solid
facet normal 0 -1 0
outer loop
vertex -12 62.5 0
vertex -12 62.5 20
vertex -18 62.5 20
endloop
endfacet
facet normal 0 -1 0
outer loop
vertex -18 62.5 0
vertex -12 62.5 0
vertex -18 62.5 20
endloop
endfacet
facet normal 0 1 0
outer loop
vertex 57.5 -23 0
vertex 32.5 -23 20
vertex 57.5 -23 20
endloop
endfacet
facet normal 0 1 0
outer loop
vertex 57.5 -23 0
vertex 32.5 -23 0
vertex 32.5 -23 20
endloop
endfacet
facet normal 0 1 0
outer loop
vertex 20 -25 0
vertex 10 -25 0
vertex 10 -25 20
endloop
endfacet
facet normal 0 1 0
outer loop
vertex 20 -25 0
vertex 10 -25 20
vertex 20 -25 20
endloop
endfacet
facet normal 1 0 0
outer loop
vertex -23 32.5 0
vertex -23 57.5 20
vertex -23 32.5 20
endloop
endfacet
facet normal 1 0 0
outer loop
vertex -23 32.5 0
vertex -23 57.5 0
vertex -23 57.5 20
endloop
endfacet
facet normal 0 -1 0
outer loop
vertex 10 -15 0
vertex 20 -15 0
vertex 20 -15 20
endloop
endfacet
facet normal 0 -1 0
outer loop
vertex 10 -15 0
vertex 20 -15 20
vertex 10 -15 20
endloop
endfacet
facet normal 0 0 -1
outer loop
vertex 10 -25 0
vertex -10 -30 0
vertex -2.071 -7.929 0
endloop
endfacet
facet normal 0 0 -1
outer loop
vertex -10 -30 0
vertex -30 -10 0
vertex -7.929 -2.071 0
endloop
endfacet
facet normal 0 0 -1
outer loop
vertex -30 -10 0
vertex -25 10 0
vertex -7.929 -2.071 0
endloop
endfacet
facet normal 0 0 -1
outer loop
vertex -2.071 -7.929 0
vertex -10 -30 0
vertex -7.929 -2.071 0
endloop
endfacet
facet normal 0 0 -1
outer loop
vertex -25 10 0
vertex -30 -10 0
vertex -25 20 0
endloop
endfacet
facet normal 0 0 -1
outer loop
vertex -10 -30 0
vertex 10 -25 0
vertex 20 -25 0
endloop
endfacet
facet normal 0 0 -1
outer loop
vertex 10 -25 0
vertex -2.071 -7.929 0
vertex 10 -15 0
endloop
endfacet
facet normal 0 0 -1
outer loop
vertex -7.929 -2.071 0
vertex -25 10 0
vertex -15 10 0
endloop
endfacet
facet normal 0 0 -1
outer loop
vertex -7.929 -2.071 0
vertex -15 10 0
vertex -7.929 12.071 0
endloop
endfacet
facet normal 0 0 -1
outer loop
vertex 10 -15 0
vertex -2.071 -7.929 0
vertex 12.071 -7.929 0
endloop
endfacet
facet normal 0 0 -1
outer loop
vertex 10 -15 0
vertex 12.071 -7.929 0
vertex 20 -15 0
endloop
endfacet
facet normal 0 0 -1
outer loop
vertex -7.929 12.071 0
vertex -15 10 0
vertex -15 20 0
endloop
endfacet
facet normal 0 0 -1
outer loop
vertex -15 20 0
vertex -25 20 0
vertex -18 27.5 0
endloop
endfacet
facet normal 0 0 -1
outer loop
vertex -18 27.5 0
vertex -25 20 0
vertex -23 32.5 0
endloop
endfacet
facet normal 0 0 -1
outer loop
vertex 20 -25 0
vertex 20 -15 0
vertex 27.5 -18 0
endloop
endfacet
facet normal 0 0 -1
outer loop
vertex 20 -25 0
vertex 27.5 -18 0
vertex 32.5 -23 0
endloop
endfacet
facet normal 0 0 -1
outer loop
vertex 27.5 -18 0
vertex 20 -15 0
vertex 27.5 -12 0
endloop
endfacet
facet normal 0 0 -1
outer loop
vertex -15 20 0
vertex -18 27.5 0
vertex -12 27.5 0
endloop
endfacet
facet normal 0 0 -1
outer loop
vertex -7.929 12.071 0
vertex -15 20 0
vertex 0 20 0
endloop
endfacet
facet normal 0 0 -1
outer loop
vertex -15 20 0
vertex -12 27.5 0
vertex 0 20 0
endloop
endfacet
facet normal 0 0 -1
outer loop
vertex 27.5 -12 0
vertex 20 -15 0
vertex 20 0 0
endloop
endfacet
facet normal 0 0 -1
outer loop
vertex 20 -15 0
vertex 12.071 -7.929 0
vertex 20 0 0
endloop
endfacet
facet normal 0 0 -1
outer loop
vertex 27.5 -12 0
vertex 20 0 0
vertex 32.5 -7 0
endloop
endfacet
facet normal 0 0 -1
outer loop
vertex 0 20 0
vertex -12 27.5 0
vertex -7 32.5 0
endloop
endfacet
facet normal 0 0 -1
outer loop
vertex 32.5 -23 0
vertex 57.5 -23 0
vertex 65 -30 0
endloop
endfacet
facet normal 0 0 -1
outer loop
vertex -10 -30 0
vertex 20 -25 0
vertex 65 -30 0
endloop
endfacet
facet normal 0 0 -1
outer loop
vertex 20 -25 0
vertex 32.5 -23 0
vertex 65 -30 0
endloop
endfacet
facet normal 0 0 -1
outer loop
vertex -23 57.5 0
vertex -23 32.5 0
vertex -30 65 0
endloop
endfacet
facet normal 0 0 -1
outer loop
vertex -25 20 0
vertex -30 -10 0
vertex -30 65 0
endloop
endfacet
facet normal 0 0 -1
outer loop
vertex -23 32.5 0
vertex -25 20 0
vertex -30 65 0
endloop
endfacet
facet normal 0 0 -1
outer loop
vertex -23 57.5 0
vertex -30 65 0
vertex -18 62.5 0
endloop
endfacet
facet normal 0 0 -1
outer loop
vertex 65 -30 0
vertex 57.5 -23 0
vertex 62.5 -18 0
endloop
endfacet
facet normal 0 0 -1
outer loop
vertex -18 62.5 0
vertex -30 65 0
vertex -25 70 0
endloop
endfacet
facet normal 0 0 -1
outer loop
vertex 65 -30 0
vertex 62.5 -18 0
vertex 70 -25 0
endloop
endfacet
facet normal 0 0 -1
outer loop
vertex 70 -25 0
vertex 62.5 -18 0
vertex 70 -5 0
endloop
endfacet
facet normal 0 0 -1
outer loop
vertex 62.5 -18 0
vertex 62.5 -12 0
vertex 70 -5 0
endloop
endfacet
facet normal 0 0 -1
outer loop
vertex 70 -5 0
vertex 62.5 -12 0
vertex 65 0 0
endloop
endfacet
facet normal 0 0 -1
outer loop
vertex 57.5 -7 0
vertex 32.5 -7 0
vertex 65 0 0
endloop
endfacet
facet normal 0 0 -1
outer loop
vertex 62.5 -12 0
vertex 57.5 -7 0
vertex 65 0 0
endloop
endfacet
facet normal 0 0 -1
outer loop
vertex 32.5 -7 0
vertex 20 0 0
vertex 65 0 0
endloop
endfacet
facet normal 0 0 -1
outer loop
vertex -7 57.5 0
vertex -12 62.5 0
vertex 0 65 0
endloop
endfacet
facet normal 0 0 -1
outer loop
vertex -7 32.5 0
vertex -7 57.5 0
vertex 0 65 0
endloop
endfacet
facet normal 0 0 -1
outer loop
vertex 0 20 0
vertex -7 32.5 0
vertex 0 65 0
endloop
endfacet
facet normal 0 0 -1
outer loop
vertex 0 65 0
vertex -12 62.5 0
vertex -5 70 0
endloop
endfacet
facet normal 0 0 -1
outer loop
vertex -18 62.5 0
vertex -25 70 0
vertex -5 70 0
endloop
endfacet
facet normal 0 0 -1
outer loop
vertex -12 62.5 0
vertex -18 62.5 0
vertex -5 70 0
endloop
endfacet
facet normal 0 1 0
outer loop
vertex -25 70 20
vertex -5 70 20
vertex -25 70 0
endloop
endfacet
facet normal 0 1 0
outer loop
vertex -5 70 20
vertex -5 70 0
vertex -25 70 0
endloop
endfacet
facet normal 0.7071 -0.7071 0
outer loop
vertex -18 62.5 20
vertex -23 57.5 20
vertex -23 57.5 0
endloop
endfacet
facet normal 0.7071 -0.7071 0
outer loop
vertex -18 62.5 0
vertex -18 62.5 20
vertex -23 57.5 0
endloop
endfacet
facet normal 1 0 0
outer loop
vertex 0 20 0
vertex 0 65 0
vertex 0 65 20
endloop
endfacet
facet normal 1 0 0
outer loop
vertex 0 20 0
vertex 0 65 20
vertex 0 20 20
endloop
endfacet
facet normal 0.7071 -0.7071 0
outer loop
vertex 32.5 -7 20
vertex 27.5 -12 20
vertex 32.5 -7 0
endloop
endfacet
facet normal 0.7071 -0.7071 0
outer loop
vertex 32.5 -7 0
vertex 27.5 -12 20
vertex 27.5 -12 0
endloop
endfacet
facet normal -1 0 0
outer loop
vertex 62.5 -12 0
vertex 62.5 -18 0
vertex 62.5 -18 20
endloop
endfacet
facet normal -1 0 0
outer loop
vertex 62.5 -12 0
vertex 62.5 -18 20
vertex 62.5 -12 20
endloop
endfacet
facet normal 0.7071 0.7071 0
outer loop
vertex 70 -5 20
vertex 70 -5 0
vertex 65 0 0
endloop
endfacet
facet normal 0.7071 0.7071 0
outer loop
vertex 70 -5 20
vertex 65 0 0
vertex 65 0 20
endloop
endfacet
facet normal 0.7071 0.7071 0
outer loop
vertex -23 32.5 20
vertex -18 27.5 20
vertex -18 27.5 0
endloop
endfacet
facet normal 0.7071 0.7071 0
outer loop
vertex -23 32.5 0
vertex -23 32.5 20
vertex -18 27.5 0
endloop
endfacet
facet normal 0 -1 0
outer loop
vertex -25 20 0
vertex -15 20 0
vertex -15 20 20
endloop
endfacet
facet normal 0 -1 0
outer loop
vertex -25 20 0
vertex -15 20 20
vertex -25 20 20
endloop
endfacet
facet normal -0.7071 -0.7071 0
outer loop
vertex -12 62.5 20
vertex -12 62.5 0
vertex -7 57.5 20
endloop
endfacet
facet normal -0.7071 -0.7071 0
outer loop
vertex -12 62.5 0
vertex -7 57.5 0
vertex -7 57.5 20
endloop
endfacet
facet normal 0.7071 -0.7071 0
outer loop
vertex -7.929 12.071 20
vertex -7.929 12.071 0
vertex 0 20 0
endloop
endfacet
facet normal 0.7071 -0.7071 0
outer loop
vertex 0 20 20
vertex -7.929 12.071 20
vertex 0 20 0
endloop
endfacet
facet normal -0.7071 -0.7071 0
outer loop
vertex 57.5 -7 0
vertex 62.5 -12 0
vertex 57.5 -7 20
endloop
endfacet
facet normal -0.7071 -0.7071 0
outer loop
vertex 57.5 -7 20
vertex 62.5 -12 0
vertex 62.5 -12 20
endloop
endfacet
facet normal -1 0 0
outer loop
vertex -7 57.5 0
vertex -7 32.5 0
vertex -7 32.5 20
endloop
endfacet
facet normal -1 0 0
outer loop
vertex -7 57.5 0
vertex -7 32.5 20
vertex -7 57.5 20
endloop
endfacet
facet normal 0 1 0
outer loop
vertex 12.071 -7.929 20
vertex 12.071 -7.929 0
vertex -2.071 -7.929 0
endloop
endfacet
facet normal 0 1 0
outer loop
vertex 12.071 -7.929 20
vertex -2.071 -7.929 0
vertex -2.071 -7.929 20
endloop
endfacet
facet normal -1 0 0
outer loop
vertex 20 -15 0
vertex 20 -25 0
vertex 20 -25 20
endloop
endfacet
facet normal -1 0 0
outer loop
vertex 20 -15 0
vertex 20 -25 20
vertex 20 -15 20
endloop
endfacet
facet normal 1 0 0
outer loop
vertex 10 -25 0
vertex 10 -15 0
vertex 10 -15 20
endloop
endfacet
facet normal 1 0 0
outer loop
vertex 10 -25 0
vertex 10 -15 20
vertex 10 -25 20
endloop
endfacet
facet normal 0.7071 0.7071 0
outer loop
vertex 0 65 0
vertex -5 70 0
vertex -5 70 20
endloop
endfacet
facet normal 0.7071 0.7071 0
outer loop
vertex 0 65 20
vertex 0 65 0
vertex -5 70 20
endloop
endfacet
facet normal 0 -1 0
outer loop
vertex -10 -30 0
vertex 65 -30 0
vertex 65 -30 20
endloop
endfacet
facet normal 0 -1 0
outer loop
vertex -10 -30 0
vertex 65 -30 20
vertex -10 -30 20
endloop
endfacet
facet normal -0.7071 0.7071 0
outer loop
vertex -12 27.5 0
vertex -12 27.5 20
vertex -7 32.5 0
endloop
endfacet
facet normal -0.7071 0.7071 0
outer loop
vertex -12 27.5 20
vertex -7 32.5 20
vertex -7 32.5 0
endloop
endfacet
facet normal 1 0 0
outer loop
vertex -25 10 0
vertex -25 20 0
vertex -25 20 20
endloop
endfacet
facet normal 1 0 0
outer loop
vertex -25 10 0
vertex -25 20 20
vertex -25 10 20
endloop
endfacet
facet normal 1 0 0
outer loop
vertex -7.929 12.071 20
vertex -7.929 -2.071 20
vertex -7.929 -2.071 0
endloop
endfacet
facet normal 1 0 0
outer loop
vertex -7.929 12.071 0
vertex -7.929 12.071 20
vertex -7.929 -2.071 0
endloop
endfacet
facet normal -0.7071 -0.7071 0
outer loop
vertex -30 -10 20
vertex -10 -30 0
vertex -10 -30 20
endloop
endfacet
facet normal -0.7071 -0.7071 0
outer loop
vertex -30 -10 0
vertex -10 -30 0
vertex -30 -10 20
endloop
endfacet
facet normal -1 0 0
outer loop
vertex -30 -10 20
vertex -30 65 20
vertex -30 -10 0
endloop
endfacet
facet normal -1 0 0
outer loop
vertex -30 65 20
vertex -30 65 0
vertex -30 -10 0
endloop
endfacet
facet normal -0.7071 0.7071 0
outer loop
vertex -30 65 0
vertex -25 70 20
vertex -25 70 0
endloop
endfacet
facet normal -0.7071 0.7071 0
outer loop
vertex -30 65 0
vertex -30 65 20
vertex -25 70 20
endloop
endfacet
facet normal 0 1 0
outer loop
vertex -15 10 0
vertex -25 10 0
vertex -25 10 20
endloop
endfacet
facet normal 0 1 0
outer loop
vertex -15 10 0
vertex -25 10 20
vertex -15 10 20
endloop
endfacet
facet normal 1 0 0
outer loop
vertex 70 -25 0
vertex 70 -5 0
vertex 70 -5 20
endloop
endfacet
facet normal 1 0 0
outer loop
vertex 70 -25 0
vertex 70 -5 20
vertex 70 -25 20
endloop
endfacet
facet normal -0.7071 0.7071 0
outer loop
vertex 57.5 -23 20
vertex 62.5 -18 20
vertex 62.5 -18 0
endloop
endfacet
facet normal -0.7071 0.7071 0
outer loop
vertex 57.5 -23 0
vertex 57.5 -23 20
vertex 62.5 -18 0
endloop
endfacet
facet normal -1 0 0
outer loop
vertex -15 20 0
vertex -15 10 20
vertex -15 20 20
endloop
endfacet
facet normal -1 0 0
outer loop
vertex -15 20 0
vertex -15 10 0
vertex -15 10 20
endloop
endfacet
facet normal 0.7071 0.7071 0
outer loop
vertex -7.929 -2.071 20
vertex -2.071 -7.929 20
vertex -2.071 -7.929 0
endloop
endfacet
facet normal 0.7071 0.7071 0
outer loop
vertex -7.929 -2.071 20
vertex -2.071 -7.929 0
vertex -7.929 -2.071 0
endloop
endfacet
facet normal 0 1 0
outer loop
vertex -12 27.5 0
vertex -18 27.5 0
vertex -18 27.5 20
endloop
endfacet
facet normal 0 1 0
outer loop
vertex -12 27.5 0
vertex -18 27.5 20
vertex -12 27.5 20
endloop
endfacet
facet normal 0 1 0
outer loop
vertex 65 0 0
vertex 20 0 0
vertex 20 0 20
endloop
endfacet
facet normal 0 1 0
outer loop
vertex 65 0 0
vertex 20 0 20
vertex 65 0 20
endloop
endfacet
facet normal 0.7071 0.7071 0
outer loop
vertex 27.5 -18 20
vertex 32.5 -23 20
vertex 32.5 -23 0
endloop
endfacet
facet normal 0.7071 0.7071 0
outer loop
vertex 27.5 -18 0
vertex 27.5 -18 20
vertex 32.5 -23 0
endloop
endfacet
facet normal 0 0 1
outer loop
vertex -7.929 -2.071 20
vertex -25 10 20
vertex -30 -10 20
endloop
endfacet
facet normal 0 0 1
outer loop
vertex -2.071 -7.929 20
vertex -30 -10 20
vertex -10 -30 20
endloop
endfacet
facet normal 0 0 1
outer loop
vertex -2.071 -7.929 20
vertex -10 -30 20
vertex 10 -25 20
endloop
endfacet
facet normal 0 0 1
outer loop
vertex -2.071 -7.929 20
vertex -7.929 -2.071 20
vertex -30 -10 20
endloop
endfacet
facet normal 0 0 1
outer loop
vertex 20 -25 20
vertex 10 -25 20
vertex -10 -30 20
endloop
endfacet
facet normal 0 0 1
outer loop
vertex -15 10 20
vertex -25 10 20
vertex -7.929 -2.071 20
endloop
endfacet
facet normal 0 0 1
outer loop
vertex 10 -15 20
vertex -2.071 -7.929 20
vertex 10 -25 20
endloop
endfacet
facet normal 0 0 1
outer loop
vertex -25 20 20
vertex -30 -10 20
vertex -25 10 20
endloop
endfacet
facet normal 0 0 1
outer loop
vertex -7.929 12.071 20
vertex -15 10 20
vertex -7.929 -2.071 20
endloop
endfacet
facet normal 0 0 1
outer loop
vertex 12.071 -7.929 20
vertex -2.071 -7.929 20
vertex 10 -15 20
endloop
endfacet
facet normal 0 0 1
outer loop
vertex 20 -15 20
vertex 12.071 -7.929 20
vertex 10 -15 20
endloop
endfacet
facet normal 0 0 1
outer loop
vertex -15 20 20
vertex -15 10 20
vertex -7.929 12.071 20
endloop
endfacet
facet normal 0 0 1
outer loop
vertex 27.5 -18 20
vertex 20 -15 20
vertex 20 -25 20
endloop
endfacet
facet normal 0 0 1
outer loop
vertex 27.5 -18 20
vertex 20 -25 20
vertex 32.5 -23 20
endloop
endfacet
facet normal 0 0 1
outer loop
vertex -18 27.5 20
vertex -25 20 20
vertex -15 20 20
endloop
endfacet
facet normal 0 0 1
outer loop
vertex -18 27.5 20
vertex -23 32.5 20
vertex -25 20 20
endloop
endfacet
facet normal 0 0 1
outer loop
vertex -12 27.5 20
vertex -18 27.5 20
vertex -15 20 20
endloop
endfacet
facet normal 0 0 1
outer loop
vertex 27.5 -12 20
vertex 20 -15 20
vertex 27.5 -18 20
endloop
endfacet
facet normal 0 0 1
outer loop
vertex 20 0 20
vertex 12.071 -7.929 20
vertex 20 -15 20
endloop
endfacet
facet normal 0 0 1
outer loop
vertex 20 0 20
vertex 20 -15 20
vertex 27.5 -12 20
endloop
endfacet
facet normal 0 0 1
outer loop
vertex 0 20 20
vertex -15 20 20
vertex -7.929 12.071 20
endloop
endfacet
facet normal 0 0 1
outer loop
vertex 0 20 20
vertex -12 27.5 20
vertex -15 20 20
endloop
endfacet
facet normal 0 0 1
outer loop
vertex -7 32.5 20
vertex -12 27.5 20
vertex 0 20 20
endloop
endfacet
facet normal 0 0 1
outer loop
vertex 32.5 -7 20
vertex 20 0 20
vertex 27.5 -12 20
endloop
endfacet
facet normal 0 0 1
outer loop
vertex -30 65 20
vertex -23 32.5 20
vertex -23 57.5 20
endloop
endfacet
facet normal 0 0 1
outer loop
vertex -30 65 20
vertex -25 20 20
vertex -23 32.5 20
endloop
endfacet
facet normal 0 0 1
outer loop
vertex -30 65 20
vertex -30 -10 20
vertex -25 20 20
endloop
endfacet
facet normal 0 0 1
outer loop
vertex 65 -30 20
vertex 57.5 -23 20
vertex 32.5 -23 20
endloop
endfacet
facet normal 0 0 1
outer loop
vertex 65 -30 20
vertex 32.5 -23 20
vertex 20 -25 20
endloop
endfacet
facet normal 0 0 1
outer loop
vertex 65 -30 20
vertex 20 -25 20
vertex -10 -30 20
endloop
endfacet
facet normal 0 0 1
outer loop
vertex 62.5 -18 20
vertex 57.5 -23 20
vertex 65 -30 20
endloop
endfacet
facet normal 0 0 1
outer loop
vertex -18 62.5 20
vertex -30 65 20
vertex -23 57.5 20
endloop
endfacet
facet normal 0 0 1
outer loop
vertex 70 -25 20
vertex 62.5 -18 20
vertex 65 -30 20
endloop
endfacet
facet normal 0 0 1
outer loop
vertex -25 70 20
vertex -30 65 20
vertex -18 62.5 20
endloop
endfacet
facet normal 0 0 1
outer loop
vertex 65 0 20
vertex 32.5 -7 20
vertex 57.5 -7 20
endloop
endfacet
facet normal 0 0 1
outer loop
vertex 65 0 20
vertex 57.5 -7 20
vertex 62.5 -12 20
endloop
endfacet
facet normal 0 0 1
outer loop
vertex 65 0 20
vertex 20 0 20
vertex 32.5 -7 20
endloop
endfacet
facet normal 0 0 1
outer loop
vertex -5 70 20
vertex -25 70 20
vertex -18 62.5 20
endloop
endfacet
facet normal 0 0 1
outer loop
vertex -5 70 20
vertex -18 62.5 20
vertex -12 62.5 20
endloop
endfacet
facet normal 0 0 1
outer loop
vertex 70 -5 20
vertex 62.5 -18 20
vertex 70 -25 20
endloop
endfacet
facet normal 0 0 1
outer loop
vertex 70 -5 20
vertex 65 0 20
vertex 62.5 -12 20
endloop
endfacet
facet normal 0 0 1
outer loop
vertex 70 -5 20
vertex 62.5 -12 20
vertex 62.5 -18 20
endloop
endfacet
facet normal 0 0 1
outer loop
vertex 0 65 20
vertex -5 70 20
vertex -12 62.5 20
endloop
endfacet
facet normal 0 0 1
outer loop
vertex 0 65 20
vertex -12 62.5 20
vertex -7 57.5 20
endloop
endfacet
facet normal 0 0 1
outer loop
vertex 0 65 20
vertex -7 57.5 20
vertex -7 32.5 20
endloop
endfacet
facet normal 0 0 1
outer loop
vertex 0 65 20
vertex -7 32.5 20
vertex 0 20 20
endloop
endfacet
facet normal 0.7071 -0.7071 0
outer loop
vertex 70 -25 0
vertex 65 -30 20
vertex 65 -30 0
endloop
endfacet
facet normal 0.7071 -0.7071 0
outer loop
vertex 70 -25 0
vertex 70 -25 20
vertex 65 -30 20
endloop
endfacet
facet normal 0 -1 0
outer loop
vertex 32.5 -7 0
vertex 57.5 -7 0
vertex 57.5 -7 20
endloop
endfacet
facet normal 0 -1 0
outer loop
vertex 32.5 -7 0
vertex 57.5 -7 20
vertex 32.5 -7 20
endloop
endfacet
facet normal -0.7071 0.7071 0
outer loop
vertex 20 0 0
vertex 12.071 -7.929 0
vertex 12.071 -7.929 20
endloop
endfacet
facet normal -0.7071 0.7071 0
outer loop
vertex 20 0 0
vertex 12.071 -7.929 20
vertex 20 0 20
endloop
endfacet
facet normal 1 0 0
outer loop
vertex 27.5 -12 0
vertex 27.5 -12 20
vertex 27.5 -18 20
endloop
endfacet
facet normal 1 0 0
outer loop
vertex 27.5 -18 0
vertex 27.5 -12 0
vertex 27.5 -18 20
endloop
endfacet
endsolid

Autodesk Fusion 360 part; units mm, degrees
sketch "Sketch1" plane through (0, 0, 0) normal (0, 0, 1) x (1, 0, 0)
  line L0 (-30, 70) -> (-30, -10)
  line L1 (70, -30) -> (-10, -30)
  line L2 (0, 70) -> (-30, 70)
  line L3 (70, 0) -> (70, -30)
  line L4 (-10, -30) -> (-30, -10)
  line L5 (5, -15) -> (-15, 5)
  line L6 (-15, 5) -> (0, 20)
  line L7 (5, -15) -> (20, 0)
  line L8 (0, 70) -> (0, 0)
  line L9 (0, 0) -> (70, 0)
  line L10 (62.5, -7) -> (27.5, -7)
  line L11 (27.5, -7) -> (27.5, -23)
  line L12 (27.5, -23) -> (62.5, -23)
  line L13 (62.5, -23) -> (62.5, -7)
  line L14 (62.5, -7) -> (27.5, -23) construction
  line L15 (27.5, -7) -> (62.5, -23) construction
  line L16 (-7, 62.5) -> (-23, 62.5)
  line L17 (-23, 62.5) -> (-23, 27.5)
  line L18 (-23, 27.5) -> (-7, 27.5)
  line L19 (-7, 27.5) -> (-7, 62.5)
  line L20 (-7, 62.5) -> (-23, 27.5) construction
  line L21 (-23, 62.5) -> (-7, 27.5) construction
  line L22 (-25, 10) -> (-15, 10)
  line L23 (-15, 10) -> (-15, 20)
  line L24 (-15, 20) -> (-25, 20)
  line L25 (-25, 20) -> (-25, 10)
  line L26 (-25, 10) -> (-15, 20) construction
  line L27 (-15, 10) -> (-25, 20) construction
  line L28 (10, -25) -> (20, -25)
  line L29 (20, -25) -> (20, -15)
  line L30 (20, -15) -> (10, -15)
  line L31 (10, -15) -> (10, -25)
  line L32 (10, -25) -> (20, -15) construction
  line L33 (20, -25) -> (10, -15) construction
  point P0 (45, -15)
  point P1 (-15, 45)
  point P2 (-20, 15)
  point P3 (15, -20)
  dimension "d15" = 35
  dimension "d16" = 16
  dimension "d17" = 16
  dimension "d18" = 35
extrude "Extrude1" add sketch "Sketch1" along normal blind 20 contours L0 L1 L2 L3 L4 L5 L6 L7 L8 L9
chamfer "Chamfer1" distance 10 angle 45 2 edges at (-15, 5, 10) (5, -15, 10)
chamfer "Chamfer3" distance 5 angle 45 8 edges at (-23, 62.5, 10) (-7, 62.5, 10) (-7, 27.5, 10) (-23, 27.5, 10) (27.5, -23, 10) (27.5, -7, 10) (62.5, -7, 10) (62.5, -23, 10)
chamfer "Chamfer4" distance 5 angle 45 4 edges at (-30, 70, 10) (0, 70, 10) (70, 0, 10) (70, -30, 10)
